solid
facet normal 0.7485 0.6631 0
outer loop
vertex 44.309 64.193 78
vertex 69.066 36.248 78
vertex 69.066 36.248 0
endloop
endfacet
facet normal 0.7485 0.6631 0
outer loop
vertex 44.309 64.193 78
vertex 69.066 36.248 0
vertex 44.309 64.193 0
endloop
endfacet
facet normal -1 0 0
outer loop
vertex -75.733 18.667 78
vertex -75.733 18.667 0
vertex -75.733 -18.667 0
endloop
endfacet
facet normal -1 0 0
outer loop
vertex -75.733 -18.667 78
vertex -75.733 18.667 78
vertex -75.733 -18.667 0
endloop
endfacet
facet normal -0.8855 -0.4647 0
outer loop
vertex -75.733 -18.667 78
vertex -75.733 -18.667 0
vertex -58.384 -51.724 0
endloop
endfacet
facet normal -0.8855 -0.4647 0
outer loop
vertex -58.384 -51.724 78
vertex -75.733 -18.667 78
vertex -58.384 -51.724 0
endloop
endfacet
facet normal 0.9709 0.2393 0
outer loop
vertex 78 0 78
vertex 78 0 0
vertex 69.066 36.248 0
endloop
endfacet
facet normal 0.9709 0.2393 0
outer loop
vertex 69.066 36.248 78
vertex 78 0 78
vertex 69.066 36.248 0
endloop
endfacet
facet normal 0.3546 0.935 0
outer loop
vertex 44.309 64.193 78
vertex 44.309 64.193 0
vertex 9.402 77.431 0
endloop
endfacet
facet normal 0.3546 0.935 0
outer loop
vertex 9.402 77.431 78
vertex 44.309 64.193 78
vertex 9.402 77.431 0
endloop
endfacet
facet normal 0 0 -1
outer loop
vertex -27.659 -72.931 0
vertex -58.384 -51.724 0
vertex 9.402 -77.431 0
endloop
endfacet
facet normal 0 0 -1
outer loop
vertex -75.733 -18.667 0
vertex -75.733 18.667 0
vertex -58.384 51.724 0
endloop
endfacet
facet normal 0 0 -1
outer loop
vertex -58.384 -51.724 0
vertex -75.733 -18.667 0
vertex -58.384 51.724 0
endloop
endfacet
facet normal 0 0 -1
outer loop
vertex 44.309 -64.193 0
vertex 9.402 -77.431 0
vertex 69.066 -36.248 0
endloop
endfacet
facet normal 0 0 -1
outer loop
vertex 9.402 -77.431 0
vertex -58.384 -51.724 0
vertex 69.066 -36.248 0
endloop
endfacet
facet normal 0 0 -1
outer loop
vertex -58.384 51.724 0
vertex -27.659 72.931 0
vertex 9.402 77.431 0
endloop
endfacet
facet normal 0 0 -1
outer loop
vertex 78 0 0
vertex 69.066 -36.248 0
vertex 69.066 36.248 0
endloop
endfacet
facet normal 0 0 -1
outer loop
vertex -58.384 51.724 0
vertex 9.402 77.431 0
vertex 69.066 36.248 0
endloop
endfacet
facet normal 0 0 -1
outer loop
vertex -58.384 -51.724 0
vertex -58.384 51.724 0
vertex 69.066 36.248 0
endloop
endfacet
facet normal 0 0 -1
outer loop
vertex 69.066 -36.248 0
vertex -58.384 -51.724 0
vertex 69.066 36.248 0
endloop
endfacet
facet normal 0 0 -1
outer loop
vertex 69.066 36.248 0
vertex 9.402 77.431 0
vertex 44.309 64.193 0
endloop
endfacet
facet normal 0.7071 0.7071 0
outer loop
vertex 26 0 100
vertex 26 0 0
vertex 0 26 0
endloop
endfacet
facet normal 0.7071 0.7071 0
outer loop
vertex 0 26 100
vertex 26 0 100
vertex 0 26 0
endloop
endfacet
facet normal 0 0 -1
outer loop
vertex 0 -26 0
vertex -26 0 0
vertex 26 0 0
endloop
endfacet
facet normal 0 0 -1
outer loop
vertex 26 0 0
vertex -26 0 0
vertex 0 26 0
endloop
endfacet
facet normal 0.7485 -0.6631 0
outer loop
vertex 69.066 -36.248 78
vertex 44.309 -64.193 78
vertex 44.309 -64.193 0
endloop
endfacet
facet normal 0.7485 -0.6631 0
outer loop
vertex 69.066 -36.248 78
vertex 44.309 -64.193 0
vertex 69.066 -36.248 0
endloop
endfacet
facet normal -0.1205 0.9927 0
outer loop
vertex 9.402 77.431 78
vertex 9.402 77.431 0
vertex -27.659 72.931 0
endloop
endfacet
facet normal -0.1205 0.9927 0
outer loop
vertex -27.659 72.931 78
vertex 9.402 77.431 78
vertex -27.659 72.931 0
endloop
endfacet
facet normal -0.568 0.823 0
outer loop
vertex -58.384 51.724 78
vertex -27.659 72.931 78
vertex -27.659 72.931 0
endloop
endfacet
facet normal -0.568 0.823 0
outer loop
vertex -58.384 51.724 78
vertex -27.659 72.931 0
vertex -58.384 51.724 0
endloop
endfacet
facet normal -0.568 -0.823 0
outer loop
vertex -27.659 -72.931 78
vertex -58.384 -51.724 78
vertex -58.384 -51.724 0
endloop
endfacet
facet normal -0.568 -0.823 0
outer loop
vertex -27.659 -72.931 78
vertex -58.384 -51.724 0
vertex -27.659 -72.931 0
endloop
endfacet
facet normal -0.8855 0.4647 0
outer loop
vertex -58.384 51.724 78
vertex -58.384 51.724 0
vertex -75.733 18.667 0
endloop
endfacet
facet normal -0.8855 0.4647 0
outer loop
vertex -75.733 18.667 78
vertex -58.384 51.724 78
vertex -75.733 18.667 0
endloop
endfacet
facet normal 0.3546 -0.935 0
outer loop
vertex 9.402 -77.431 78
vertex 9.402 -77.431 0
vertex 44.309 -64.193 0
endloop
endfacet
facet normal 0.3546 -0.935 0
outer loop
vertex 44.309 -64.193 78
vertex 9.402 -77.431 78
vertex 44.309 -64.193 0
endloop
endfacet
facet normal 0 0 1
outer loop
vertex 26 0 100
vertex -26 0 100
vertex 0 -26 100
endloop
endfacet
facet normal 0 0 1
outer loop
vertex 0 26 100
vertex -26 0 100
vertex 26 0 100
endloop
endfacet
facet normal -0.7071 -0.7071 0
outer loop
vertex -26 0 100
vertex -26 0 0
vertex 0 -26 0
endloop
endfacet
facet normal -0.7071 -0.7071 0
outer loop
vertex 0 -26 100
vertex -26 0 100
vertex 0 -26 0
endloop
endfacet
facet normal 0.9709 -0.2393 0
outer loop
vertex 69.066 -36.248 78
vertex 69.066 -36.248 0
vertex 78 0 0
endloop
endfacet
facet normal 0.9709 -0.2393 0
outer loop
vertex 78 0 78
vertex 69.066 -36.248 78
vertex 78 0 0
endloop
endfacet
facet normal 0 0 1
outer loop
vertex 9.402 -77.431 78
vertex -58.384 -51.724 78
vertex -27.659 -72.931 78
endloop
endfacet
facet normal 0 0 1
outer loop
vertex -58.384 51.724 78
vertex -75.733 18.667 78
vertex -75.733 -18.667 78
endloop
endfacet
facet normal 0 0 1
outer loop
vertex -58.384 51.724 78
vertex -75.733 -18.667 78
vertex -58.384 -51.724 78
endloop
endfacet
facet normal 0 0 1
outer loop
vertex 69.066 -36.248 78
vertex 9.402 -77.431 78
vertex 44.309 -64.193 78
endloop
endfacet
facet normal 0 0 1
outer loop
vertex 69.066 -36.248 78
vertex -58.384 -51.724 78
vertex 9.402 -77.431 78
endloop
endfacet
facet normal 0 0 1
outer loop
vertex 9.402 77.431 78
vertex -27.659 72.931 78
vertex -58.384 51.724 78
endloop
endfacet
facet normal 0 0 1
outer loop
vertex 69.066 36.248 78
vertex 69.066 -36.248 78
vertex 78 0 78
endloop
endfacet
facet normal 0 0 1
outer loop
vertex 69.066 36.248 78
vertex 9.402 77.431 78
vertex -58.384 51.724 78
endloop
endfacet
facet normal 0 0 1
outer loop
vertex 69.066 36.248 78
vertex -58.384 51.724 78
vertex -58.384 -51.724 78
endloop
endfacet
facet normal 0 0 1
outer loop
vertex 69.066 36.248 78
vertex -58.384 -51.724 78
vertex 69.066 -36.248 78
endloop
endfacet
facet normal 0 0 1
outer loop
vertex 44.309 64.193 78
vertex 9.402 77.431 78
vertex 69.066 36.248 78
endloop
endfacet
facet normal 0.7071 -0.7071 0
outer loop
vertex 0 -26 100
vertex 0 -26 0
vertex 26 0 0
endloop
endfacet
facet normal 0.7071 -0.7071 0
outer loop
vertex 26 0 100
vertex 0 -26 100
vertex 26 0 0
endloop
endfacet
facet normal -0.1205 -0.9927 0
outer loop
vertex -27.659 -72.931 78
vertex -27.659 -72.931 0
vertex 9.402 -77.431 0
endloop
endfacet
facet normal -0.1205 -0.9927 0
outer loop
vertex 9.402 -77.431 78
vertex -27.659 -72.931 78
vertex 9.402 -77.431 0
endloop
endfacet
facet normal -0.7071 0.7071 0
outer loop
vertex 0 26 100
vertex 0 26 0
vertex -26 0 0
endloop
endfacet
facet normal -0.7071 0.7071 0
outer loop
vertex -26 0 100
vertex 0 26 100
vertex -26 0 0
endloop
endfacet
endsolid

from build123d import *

# Parameters (mm, degrees)
PRISM_DEPTH    = 78
PRISM002_DEPTH = 100


with BuildPart() as prism:
    # Prism → Prism (new body)
    with BuildSketch(Plane.XY):
        Polygon((78, 0), (69.06557, 36.248407), (44.30905, 64.192742), (9.401861, 77.431292), (-27.659181, 72.931267), (-58.383838, 51.723567), (-75.733462, 18.666622), (-75.733462, -18.666622), (-58.383838, -51.723567), (-27.659181, -72.931267), (9.401861, -77.431292), (44.30905, -64.192742), (69.06557, -36.248407), align=None)
    extrude(amount=PRISM_DEPTH)


with BuildPart() as prism002:
    # Prism002 → Prism002 (new body)
    with BuildSketch(Plane.XY):
        Polygon((26, 0), (0, 26), (-26, 0), (0, -26), align=None)
    extrude(amount=PRISM002_DEPTH)


solid = Compound([prism.part, prism002.part])
